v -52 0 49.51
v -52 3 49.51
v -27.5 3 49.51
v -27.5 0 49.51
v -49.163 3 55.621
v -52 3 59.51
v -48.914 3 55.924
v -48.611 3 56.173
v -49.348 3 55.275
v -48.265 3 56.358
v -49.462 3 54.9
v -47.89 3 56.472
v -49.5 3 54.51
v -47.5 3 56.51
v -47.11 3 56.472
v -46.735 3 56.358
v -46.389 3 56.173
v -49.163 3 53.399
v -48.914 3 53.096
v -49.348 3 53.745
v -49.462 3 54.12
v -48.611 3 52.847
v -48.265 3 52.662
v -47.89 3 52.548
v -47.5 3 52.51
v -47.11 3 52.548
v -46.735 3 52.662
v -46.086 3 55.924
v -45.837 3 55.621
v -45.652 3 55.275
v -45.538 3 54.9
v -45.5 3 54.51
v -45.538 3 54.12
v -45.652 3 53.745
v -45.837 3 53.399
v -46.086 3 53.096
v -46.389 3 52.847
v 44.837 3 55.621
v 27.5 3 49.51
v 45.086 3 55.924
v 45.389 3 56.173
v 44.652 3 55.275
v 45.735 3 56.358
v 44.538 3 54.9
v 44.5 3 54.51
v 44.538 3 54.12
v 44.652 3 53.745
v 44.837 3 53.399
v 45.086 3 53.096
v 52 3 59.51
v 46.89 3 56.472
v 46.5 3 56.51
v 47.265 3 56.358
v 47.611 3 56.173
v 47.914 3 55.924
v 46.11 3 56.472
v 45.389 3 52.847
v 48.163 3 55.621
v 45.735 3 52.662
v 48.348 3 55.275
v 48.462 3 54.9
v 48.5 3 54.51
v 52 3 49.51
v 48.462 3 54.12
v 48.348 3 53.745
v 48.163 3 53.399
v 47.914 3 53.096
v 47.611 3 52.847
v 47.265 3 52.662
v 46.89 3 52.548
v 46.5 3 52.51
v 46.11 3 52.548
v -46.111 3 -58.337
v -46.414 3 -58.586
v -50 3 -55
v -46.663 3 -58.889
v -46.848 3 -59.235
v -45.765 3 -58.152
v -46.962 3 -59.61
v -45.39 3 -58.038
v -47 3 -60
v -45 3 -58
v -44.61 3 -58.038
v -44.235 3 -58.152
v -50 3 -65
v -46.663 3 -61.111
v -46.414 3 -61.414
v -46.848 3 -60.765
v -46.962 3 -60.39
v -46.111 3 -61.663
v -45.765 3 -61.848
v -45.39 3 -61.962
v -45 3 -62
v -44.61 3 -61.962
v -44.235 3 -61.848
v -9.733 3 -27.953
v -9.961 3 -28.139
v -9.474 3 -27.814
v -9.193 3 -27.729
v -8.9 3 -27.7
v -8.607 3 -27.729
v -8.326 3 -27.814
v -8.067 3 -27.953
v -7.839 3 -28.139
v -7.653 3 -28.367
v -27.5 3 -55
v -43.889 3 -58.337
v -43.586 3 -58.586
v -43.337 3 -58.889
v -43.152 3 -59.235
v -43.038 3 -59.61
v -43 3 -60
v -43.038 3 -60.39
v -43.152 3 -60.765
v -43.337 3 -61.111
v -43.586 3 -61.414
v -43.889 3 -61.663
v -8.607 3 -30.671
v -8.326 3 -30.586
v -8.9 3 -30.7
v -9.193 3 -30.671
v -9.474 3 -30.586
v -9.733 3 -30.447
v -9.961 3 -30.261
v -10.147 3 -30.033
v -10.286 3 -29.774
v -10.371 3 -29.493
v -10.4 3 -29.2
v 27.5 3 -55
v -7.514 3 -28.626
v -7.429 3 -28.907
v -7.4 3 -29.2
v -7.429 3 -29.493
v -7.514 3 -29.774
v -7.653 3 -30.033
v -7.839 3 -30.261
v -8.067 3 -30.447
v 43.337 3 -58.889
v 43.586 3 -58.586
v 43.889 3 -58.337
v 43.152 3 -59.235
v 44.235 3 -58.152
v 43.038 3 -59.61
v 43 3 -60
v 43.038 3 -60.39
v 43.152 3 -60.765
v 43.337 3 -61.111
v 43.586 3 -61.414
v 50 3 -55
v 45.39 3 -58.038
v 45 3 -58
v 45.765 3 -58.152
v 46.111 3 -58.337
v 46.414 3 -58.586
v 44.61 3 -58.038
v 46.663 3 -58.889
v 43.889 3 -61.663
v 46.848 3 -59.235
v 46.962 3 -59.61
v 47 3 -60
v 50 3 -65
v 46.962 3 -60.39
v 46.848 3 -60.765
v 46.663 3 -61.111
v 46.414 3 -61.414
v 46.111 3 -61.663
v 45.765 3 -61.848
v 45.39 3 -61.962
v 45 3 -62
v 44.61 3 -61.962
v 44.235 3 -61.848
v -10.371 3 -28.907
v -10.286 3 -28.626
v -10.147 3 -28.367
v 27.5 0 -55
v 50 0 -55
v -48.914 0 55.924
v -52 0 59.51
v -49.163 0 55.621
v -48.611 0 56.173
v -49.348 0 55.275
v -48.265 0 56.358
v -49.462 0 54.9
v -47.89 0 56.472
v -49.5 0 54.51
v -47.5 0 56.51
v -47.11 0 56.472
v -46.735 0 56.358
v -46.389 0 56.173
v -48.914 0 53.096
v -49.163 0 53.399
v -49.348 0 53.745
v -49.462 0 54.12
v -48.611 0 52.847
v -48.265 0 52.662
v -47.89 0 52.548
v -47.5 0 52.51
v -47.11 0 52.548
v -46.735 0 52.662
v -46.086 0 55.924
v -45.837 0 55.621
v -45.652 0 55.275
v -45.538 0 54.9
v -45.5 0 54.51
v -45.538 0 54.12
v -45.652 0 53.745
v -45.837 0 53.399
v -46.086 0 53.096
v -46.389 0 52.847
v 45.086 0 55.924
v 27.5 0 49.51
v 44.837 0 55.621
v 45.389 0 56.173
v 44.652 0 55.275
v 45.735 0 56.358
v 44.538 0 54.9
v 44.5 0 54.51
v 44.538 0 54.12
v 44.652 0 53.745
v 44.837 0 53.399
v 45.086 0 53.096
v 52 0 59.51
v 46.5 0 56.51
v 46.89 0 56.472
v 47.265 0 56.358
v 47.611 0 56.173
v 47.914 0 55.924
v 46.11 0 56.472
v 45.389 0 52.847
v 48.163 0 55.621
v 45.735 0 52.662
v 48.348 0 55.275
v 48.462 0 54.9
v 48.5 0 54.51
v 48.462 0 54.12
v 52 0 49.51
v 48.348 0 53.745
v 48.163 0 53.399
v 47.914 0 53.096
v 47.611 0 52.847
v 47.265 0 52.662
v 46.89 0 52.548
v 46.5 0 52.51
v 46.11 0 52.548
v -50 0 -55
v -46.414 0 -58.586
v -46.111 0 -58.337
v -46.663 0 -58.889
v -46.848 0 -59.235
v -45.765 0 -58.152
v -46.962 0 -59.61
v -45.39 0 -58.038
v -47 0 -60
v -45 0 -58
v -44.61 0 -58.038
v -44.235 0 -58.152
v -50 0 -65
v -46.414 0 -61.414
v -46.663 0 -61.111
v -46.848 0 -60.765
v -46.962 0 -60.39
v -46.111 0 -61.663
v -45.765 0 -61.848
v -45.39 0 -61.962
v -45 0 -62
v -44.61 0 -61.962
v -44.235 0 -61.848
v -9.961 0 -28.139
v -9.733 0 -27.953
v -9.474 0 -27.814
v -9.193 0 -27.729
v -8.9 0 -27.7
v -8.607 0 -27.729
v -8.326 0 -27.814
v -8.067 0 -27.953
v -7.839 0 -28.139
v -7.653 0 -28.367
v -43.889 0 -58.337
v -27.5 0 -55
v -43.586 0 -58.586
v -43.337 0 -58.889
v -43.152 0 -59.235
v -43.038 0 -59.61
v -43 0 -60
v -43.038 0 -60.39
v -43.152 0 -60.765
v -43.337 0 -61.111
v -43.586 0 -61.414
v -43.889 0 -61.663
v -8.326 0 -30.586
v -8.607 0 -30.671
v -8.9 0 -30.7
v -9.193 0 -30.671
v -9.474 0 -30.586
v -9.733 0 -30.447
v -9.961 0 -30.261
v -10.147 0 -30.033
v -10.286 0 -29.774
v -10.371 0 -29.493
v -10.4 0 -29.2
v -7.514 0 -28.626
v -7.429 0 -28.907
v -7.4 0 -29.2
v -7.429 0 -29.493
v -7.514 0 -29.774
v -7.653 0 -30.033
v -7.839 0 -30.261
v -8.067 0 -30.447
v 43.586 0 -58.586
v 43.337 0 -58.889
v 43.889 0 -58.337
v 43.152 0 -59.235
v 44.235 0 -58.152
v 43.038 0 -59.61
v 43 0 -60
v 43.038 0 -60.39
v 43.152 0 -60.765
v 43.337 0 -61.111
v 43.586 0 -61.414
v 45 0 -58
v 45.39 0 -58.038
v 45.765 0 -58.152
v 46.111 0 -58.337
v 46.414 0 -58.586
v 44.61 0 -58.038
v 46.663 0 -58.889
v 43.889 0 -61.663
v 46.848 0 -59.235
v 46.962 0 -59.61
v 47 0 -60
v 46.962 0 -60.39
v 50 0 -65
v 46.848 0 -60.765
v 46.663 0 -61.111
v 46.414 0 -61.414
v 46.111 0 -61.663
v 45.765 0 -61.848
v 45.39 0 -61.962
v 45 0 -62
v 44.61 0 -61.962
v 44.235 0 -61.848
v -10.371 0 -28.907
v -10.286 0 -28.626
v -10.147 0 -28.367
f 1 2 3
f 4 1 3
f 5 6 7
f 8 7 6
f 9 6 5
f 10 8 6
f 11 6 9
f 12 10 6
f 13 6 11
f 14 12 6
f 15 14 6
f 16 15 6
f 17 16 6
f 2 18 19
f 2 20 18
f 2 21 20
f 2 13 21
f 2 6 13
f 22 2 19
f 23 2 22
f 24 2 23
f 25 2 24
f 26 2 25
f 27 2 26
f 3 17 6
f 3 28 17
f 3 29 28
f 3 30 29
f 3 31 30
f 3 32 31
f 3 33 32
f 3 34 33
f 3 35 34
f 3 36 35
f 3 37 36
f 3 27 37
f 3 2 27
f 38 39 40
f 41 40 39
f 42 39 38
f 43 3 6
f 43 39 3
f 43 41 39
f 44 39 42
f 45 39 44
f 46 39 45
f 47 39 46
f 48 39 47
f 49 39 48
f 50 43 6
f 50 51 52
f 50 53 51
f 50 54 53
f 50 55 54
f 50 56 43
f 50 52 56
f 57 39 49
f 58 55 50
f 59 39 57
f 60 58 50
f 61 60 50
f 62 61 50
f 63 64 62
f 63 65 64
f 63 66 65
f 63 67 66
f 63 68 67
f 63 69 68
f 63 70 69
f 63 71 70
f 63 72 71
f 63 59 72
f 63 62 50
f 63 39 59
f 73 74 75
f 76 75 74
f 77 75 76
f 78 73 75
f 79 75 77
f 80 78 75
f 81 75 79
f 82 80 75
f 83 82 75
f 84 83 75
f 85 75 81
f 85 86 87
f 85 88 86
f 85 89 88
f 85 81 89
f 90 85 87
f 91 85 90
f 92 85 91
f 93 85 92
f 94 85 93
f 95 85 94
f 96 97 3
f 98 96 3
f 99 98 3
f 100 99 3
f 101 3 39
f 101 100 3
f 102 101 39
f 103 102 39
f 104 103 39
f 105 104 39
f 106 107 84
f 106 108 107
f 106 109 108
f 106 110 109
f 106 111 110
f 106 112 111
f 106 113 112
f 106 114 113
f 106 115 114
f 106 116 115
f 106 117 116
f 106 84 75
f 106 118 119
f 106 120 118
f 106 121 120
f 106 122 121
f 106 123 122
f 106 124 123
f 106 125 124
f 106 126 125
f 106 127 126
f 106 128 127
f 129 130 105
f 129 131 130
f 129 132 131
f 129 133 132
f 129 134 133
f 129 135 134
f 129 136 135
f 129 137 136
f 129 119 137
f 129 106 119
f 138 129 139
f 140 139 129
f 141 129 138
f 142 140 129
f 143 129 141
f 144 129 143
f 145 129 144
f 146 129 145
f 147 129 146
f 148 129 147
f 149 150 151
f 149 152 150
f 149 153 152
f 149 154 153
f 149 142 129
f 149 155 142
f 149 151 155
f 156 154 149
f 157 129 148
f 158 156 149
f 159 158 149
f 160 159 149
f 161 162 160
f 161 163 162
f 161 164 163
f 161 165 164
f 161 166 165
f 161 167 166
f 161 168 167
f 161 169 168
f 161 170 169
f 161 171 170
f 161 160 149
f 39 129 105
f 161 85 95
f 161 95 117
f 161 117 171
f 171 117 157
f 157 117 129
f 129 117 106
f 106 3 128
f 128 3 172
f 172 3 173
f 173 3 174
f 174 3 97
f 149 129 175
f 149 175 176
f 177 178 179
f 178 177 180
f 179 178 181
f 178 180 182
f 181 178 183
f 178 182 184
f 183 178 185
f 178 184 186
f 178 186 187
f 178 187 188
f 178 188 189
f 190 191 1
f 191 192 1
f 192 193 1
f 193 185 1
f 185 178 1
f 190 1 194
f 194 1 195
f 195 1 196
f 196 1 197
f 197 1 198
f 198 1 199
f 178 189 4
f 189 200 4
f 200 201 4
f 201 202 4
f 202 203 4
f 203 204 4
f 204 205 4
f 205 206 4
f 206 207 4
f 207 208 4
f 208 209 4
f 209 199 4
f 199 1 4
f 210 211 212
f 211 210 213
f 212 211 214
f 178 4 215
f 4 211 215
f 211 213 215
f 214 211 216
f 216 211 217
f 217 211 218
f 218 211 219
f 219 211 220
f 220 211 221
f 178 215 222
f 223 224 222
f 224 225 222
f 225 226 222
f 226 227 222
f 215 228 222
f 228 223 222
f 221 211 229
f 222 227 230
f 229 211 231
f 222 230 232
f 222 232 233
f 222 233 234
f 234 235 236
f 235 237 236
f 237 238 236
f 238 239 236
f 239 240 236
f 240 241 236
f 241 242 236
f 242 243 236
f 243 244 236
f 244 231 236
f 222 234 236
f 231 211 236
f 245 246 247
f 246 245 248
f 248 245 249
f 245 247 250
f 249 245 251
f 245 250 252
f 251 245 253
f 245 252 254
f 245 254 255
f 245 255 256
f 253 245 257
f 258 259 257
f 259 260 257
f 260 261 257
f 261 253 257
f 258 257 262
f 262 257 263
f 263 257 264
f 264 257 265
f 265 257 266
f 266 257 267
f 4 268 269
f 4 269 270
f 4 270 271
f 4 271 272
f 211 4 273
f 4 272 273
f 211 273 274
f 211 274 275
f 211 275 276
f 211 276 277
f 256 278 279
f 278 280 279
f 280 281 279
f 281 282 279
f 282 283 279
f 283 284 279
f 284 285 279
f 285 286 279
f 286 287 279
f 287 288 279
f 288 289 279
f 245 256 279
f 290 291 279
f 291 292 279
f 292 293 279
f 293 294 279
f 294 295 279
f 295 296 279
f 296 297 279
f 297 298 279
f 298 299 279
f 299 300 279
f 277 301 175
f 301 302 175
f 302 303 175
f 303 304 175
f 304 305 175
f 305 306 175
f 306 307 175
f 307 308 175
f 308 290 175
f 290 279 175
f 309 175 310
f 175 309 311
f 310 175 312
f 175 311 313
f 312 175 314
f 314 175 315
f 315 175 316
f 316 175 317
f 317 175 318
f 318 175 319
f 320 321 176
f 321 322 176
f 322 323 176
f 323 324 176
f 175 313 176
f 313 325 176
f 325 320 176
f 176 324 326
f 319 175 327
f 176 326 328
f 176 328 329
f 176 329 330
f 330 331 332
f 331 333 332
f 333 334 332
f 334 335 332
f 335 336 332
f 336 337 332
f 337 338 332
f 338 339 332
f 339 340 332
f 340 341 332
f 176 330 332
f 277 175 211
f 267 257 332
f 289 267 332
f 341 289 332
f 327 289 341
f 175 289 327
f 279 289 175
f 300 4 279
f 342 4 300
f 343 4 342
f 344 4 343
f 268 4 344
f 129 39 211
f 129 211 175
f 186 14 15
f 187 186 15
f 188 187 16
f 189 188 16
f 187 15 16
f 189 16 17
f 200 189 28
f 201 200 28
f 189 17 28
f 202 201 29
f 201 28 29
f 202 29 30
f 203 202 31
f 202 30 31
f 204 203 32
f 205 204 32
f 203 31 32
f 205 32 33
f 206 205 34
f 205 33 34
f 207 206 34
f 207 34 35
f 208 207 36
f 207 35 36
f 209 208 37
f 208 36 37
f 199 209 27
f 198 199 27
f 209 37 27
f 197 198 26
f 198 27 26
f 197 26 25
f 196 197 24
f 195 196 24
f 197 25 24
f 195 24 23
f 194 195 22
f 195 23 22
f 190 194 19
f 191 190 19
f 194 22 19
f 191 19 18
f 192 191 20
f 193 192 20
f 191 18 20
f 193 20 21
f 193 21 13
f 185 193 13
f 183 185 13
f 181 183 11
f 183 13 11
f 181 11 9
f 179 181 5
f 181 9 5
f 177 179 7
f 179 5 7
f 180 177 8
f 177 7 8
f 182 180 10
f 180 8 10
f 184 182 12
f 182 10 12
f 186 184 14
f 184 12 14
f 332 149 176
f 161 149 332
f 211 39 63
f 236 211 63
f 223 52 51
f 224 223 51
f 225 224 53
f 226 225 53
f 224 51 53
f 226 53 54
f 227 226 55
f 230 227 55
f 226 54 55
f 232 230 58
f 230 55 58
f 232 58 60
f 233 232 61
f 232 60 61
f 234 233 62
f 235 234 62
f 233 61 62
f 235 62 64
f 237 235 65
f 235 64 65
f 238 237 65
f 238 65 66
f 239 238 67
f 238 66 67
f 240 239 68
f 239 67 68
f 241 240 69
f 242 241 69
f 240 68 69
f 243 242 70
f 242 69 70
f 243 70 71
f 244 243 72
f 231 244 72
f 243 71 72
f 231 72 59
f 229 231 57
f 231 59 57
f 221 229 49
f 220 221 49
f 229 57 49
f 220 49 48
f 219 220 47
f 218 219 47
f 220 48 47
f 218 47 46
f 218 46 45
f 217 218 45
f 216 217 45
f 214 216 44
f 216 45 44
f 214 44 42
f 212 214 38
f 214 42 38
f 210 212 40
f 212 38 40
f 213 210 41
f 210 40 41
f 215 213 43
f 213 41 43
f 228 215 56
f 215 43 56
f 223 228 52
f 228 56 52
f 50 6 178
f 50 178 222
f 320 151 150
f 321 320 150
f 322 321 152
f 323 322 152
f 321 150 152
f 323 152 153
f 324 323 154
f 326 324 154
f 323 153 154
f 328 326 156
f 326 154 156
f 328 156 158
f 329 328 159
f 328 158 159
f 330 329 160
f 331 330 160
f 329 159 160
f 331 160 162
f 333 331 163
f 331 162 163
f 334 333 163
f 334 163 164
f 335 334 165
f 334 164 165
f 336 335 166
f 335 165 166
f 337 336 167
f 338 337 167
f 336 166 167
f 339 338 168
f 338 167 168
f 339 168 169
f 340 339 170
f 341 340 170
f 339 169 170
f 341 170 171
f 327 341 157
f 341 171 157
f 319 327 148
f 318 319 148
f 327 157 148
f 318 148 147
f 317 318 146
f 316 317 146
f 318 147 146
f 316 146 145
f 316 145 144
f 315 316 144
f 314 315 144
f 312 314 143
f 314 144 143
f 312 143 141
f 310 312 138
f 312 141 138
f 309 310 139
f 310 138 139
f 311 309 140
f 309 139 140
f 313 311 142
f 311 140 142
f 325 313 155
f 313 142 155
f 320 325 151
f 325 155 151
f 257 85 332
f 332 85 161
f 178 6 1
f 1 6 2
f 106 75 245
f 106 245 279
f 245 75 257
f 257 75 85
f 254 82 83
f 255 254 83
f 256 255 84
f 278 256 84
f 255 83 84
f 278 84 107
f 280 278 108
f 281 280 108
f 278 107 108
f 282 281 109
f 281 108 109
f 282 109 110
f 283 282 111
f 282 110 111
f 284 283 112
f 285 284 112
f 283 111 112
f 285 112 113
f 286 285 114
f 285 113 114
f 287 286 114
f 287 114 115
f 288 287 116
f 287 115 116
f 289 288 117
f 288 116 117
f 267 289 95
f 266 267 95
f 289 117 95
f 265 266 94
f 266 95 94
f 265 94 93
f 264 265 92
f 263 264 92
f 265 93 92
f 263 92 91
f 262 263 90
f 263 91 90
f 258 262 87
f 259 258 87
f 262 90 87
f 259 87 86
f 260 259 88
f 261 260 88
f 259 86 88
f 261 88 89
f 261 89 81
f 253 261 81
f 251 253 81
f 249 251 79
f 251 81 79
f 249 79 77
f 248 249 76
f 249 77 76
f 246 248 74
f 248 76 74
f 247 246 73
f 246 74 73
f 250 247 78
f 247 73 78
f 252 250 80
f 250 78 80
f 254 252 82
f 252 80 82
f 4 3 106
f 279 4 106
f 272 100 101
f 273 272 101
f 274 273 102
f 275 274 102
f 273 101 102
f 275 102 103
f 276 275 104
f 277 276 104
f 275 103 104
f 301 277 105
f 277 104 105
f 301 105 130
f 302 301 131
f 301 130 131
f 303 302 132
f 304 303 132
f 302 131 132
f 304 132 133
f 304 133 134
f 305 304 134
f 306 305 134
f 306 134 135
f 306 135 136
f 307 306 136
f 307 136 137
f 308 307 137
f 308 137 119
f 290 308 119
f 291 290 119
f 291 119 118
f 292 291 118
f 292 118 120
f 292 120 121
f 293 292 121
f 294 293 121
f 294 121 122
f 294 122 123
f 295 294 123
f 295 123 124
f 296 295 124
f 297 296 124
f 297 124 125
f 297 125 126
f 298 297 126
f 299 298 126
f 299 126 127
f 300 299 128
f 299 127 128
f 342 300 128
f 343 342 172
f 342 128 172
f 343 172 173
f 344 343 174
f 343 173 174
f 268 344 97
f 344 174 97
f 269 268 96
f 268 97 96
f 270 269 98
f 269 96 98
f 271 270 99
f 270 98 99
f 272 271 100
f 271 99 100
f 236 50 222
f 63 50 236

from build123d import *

# Parameters (mm, degrees)
CROQUIS1_R              = 75
SALIENTE_EXTRUIR1_DEPTH = 3
CROQUIS5_W              = 55
CROQUIS5_H              = 104.51
CORTAR_EXTRUIR10_DEPTH  = 107.108435103
CROQUIS10_W             = 100
CROQUIS10_H             = 10
CROQUIS10_R             = 2
SALIENTE_EXTRUIR2_DEPTH = 3
CROQUIS12_W             = 104
CROQUIS12_H             = 10
CROQUIS12_R             = 2
SALIENTE_EXTRUIR3_DEPTH = 3
CROQUIS13_R             = 1.5
CORTAR_EXTRUIR11_DEPTH  = 84.294657692


with BuildPart() as part:
    # Croquis1 → Saliente-Extruir1 (new body)
    with BuildSketch(Plane(origin=(0, 0, 0), x_dir=(1, 0, 0), z_dir=(0, 1, 0))):
        with Locations(Location((0, 0, 0), (0, 0, 270))):
            Circle(CROQUIS1_R)
    extrude(amount=SALIENTE_EXTRUIR1_DEPTH)

    # Croquis5 → Cortar-Extruir10 (cut, through all)
    with BuildSketch(Plane(origin=(0, 3, 0), x_dir=(1, 0, 0), z_dir=(0, 1, 0))):
        Polygon((53, 55), (53, 77), (-53, 77), (-53, 55), (-77.5, 55), (-77.5, -70), (-27.5, -70), (-27.5, -78), (27.5, -78), (27.5, -70), (75, -70), (75, 55), align=None)
        with Locations((0, 2.745)):
            Rectangle(CROQUIS5_W, CROQUIS5_H, mode=Mode.SUBTRACT)
    extrude(amount=-CORTAR_EXTRUIR10_DEPTH, mode=Mode.SUBTRACT)

    # Croquis10 → Saliente-Extruir2 (add)
    with BuildSketch(Plane(origin=(0, 3, 0), x_dir=(1, 0, 0), z_dir=(0, 1, 0))):
        with Locations((0, 60)):
            Rectangle(CROQUIS10_W, CROQUIS10_H)
        with Locations(Location((-45, 60, 0), (0, 0, 270))):
            Circle(CROQUIS10_R, mode=Mode.SUBTRACT)
        with Locations(Location((45, 60, 0), (0, 0, 270))):
            Circle(CROQUIS10_R, mode=Mode.SUBTRACT)
    extrude(amount=-SALIENTE_EXTRUIR2_DEPTH)

    # Croquis12 → Saliente-Extruir3 (add)
    with BuildSketch(Plane(origin=(0, 3, 0), x_dir=(1, 0, 0), z_dir=(0, 1, 0))):
        with Locations((0, -54.51)):
            Rectangle(CROQUIS12_W, CROQUIS12_H)
        with Locations(Location((-47.5, -54.51, 0), (0, 0, 270))):
            Circle(CROQUIS12_R, mode=Mode.SUBTRACT)
        with Locations(Location((46.5, -54.51, 0), (0, 0, 270))):
            Circle(CROQUIS12_R, mode=Mode.SUBTRACT)
    extrude(amount=-SALIENTE_EXTRUIR3_DEPTH)

    # Croquis13 → Cortar-Extruir11 (cut, through all)
    with BuildSketch(Plane(origin=(0, 3, 0), x_dir=(1, 0, 0), z_dir=(0, 1, 0))):
        with Locations(Location((-8.9, 29.2, 0), (0, 0, 270))):
            Circle(CROQUIS13_R)
    extrude(amount=-CORTAR_EXTRUIR11_DEPTH, mode=Mode.SUBTRACT)


solid = part.part
